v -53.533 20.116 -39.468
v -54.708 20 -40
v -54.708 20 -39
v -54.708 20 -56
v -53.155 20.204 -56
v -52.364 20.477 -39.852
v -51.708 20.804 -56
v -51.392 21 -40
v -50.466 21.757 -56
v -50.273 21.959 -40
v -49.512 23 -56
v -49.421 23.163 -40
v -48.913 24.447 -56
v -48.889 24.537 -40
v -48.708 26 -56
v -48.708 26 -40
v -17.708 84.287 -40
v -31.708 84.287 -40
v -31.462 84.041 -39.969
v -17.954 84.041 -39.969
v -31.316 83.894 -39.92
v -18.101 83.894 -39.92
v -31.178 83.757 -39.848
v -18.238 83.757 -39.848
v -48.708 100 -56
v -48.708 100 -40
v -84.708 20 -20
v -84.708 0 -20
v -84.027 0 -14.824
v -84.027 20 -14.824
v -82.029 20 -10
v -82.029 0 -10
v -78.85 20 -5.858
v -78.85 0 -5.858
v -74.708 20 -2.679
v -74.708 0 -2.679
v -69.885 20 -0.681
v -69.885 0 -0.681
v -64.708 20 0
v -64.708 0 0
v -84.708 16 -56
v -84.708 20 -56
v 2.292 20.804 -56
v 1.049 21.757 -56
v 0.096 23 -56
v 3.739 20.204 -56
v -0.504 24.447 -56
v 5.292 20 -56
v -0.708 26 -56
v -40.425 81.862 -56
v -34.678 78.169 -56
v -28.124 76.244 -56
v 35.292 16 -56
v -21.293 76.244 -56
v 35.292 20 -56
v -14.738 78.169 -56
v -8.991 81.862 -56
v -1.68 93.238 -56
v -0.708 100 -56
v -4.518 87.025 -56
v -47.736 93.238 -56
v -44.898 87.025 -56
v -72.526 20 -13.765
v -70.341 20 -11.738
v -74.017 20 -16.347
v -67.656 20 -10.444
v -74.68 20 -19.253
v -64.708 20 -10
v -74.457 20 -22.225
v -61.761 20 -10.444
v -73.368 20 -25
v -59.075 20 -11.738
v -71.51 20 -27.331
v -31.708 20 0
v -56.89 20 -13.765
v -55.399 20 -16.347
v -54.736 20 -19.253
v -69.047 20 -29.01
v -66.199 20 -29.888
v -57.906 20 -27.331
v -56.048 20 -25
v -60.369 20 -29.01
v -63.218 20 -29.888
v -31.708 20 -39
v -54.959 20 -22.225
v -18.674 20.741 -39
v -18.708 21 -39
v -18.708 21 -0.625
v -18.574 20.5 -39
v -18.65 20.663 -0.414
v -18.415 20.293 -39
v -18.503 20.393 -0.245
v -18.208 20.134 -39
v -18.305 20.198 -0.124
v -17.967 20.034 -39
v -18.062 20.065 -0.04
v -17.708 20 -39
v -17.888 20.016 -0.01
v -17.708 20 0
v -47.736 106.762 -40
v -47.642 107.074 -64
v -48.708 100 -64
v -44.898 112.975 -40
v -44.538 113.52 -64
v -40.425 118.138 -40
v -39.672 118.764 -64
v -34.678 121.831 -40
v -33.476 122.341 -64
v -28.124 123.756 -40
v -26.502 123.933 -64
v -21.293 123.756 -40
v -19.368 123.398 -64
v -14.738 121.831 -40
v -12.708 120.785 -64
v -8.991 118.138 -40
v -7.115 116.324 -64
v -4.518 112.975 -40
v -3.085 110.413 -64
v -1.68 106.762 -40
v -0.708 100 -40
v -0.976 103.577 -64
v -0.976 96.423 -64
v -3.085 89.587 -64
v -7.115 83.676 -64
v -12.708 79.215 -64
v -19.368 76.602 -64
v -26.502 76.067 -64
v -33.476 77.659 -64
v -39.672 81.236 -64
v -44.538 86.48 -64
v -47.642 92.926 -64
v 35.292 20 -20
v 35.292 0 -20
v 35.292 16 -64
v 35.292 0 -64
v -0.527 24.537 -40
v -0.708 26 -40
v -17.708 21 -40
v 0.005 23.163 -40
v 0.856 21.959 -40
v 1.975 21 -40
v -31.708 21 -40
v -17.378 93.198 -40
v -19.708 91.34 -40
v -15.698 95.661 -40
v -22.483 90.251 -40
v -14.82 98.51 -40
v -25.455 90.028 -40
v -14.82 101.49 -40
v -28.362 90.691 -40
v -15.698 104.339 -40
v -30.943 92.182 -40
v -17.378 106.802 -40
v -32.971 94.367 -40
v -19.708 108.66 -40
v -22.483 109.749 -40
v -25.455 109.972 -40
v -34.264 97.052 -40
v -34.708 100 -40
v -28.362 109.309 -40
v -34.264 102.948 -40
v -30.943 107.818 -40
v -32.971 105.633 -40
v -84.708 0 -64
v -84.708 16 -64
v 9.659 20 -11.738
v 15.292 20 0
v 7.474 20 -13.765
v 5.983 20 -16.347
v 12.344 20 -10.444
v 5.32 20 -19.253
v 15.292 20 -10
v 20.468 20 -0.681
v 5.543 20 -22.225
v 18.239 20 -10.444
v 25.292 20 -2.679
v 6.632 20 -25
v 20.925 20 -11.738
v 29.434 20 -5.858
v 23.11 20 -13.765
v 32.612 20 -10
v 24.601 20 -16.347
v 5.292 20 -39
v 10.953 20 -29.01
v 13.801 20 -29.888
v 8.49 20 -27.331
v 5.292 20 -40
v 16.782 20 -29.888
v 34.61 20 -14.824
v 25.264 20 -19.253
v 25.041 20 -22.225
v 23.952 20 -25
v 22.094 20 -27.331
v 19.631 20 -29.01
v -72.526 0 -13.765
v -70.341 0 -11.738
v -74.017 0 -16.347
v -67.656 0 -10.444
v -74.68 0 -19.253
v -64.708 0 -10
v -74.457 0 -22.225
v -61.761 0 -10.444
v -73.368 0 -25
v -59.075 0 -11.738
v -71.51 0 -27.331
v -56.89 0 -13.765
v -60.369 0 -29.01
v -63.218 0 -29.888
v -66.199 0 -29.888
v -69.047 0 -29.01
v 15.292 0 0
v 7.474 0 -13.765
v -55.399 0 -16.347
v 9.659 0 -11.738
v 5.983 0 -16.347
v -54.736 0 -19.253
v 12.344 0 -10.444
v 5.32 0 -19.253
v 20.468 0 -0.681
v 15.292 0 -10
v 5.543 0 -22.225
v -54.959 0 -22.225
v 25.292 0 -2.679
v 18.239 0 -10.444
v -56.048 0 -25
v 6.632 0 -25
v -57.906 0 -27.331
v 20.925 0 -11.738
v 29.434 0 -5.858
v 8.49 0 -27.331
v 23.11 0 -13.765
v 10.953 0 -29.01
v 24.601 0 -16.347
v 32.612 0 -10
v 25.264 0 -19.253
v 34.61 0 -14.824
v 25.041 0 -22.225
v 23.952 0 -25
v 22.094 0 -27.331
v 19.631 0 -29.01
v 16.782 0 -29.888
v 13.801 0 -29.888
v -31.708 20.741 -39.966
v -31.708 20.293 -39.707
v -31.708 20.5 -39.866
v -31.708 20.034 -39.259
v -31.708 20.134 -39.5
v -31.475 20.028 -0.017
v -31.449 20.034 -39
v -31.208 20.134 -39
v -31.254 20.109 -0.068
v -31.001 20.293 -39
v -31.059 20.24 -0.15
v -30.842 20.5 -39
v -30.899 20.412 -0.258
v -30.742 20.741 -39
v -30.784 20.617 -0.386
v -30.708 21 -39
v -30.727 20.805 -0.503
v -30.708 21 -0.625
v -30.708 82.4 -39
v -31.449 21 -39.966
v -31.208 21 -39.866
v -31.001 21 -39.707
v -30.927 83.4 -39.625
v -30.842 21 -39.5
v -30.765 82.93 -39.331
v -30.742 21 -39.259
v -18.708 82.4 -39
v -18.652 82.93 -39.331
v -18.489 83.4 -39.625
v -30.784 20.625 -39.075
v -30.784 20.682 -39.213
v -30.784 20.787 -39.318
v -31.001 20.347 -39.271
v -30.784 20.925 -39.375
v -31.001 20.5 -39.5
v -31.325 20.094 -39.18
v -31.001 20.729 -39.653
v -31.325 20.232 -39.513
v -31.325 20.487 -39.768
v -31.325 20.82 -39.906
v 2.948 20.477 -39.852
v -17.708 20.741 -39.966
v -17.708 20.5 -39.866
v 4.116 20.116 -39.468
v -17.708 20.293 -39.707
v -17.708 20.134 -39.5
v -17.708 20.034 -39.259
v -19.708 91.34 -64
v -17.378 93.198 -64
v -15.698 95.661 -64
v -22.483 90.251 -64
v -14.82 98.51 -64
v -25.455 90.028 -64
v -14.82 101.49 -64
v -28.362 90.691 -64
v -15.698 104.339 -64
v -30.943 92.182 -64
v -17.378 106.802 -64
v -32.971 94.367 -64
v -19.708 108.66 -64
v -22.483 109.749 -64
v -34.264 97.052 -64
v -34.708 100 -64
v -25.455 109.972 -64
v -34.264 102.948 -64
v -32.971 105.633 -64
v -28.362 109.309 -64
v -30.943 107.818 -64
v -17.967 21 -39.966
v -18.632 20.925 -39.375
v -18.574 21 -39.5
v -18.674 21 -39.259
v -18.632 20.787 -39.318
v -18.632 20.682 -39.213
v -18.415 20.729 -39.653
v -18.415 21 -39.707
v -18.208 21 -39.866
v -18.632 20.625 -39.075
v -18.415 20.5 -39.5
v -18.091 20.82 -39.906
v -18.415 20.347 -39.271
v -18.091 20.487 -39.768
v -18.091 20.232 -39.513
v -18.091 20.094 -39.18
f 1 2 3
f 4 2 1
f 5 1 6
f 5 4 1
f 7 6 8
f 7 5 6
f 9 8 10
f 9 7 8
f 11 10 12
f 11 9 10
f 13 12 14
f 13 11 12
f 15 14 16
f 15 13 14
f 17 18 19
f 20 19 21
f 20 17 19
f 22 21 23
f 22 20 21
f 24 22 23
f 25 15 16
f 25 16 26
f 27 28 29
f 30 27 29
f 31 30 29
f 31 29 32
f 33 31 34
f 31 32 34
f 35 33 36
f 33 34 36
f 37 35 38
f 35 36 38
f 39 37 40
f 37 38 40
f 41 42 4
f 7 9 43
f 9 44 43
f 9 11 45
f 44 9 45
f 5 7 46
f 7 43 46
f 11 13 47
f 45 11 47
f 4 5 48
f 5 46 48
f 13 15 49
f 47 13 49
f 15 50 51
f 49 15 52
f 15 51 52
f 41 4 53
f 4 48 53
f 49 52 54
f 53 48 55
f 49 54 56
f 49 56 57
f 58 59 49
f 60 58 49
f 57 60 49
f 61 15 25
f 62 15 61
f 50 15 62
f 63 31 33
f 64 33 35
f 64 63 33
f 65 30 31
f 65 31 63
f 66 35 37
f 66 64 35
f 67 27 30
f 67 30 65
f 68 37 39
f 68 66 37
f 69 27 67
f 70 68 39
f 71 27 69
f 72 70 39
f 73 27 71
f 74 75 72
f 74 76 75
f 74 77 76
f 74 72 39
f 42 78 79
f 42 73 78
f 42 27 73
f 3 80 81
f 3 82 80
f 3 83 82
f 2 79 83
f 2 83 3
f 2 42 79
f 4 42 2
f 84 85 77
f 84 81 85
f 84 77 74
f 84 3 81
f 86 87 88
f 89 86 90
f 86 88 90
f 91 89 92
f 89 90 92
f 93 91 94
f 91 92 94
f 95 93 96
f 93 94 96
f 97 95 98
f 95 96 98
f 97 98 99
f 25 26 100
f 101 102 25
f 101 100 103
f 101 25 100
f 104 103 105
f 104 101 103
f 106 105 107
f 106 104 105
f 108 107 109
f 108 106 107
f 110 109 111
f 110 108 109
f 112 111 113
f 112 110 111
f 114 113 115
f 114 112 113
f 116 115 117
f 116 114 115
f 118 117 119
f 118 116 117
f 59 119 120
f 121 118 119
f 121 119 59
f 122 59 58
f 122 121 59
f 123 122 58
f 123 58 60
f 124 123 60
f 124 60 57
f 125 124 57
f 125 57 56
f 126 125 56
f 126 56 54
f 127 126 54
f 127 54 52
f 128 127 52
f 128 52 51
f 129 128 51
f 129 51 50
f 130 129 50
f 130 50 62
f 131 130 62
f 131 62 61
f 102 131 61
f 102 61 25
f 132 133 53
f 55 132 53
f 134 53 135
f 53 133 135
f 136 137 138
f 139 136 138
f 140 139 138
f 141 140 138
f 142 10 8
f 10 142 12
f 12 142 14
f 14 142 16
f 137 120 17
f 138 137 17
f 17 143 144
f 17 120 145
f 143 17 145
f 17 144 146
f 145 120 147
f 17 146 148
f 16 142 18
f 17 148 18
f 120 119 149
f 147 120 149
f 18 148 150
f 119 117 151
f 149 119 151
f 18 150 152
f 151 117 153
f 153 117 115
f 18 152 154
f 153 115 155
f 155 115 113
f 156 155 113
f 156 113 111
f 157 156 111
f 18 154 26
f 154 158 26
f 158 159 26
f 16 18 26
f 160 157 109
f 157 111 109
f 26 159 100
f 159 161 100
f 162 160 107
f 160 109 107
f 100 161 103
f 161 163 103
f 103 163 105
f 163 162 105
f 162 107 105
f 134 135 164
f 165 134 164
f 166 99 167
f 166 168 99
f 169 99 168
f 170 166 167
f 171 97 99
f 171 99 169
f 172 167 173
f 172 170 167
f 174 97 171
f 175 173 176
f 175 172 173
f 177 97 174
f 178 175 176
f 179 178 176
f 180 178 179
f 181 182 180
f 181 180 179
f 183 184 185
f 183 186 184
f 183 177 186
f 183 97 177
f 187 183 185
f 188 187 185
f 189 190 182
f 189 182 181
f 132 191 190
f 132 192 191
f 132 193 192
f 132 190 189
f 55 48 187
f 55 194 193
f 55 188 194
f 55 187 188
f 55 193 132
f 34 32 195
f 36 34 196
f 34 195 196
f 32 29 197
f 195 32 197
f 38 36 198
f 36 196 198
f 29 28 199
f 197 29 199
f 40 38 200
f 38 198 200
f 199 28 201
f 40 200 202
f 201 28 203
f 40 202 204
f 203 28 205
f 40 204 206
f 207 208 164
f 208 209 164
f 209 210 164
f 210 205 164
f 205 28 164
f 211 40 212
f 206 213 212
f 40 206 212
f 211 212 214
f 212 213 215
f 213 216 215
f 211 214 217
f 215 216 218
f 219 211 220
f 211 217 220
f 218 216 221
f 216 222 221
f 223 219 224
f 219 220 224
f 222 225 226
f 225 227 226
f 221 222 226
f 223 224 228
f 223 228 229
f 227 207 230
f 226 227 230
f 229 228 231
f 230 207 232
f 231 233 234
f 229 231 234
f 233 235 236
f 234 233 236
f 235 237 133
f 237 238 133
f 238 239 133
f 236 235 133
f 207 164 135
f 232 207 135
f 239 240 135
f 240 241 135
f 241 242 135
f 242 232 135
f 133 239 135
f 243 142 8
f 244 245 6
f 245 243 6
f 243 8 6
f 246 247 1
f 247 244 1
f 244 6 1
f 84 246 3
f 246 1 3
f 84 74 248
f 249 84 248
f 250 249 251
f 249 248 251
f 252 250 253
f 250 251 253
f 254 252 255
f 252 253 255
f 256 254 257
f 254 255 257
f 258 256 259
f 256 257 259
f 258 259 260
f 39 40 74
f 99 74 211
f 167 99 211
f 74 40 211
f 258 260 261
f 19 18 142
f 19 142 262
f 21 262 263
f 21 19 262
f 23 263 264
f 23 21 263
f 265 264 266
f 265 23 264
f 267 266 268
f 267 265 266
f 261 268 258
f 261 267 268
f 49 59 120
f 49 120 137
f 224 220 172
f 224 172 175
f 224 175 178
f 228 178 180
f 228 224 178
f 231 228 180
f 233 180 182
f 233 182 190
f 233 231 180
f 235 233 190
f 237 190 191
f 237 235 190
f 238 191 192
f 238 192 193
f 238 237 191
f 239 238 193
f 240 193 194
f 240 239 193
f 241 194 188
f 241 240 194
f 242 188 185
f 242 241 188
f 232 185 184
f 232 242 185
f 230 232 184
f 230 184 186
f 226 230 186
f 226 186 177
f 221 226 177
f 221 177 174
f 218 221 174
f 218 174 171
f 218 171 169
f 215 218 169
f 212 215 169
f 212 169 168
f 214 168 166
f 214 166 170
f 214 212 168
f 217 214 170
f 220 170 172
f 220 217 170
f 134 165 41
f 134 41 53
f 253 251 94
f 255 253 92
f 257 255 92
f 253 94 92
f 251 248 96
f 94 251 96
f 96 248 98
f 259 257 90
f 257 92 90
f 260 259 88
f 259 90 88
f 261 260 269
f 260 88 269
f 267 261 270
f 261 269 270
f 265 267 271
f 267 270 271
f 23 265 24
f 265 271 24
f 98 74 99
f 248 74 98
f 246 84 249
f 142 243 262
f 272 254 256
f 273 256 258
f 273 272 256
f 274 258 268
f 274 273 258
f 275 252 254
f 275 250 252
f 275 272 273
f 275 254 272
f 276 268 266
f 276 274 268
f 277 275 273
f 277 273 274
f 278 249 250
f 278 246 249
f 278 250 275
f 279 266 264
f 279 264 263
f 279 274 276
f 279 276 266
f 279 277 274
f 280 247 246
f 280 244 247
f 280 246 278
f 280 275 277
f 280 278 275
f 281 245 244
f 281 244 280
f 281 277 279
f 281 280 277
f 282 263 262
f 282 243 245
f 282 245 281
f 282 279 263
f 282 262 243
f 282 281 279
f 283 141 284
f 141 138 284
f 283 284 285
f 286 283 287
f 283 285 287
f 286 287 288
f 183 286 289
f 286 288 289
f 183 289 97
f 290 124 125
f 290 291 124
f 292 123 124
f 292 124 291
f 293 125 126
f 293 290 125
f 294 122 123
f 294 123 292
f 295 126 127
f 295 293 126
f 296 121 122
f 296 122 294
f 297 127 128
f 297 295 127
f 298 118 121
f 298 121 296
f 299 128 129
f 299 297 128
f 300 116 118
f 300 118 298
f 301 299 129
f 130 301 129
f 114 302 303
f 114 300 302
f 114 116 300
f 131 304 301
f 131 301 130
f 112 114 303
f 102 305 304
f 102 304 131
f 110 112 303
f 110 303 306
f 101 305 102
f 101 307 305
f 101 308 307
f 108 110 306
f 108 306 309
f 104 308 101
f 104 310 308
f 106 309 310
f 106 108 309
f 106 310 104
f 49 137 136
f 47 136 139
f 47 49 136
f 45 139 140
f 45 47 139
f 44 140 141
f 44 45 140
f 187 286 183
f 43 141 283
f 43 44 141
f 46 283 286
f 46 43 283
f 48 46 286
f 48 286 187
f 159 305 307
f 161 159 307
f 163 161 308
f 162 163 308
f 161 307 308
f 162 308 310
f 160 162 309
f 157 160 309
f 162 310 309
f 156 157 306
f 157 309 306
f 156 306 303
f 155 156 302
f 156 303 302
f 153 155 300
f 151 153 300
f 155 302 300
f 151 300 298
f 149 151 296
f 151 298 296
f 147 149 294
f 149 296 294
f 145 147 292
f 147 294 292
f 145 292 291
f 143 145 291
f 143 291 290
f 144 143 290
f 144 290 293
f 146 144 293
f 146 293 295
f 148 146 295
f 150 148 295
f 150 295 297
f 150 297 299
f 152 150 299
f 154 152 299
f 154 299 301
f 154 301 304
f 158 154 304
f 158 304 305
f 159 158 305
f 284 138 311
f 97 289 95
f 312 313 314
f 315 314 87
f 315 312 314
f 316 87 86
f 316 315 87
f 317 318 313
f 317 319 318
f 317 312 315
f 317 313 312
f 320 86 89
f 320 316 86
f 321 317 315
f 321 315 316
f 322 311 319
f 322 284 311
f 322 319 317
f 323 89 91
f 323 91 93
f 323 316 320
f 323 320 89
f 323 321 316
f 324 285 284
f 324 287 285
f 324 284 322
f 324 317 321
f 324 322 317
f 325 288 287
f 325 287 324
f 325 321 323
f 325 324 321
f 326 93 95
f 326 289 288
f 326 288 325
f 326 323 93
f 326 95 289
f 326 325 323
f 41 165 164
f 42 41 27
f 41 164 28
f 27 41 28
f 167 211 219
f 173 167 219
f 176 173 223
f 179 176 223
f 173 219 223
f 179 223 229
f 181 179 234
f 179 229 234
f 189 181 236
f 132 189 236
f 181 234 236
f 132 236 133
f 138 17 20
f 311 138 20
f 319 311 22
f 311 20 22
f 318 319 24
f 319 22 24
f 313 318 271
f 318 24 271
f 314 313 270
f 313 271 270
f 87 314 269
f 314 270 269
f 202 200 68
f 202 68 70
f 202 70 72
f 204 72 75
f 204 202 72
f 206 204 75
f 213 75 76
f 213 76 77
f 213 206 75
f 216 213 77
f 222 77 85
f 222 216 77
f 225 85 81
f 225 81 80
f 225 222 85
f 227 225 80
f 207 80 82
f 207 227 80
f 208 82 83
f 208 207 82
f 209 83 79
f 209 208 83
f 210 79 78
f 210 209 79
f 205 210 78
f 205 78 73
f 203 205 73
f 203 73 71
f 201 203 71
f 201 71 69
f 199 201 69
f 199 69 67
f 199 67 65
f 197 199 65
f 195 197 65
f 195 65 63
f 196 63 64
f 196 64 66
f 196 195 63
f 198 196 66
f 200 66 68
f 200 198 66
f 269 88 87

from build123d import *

# Parameters (mm, degrees)
SKETCH2_R           = 10
BOSS_EXTRUDE1_DEPTH = 20
SKETCH3_W           = 120
SKETCH3_H           = 8
CUT_EXTRUDE1_DEPTH  = 4
SKETCH7_R           = 10
BOSS_EXTRUDE2_DEPTH = 16
BOSS_EXTRUDE3_START = 8
SKETCH8_R           = 24
SKETCH8_R_2         = 10
BOSS_EXTRUDE3_DEPTH = 8
RIB4_REACH          = 153.895
SKETCH9_WALL_W      = 381.261249794
SKETCH9_WALL_H      = 12
FILLET2_R           = 1


with BuildPart() as part:
    # Sketch2 → Boss-Extrude1 (new body)
    with BuildSketch(Plane(origin=(0, 0, 0), x_dir=(1, 0, 0), z_dir=(0, 1, 0))):
        with BuildLine():
            Line((-64.708154955, 0), (15.291845045, 0))
            ThreePointArc((15.291845045, 0), (29.433980669, 5.857864376), (35.291845045, 20))
            Line((35.291845045, 20), (35.291845045, 64))
            Line((35.291845045, 64), (-84.708154955, 64))
            Line((-84.708154955, 64), (-84.708154955, 20))
            ThreePointArc((-84.708154955, 20), (-78.850290578, 5.857864376), (-64.708154955, 0))
        make_face()
        with Locations(Location((-64.708154955, 20, 0), (0, 0, 270))):
            Circle(SKETCH2_R, mode=Mode.SUBTRACT)
        with Locations(Location((15.291845045, 20, 0), (0, 0, 270))):
            Circle(SKETCH2_R, mode=Mode.SUBTRACT)
    extrude(amount=BOSS_EXTRUDE1_DEPTH)

    # Sketch3 → Cut-Extrude1 (cut)
    with BuildSketch(Plane(origin=(0, 20, 0), x_dir=(1, 0, 0), z_dir=(0, 1, 0))):
        with Locations((-24.708154955, 60)):
            Rectangle(SKETCH3_W, SKETCH3_H)
    extrude(amount=-CUT_EXTRUDE1_DEPTH, mode=Mode.SUBTRACT)

    # Sketch7 → Boss-Extrude2 (add)
    with BuildSketch(Plane(origin=(0, 0, -56), x_dir=(-1, 0, 0), z_dir=(0, 0, -1))):
        with BuildLine():
            Line((24.708154955, 20), (54.708154955, 20))
            ThreePointArc((54.708154955, 20), (50.465514267, 21.757359313), (48.708154955, 26))
            Line((48.708154955, 26), (48.708154955, 100))
            ThreePointArc((48.708154955, 100), (24.708154955, 124), (0.708154955, 100))
            Line((0.708154955, 100), (0.708154955, 26))
            ThreePointArc((0.708154955, 26), (-1.049204358, 21.757359313), (-5.291845045, 20))
            Line((-5.291845045, 20), (24.708154955, 20))
        make_face()
        with Locations((24.708154955, 100)):
            Circle(SKETCH7_R, mode=Mode.SUBTRACT)
    extrude(amount=-BOSS_EXTRUDE2_DEPTH)

    # Sketch8 → Boss-Extrude3 (add)
    with BuildSketch(Plane(origin=(0, 0, -56), x_dir=(-1, 0, 0), z_dir=(0, 0, -1)).offset(BOSS_EXTRUDE3_START)):
        with Locations((24.708154955, 100)):
            Circle(SKETCH8_R)
        with Locations((24.708154955, 100)):
            Circle(SKETCH8_R_2, mode=Mode.SUBTRACT)
    extrude(amount=-BOSS_EXTRUDE3_DEPTH)

    # Sketch9 wall → Rib4 (add, up to next)
    with BuildSketch(Plane(origin=(-24.708154955, 52, -20), x_dir=(0, 0.847998304005, -0.529998940003), z_dir=(0, -0.529998940003, -0.847998304005)), mode=Mode.PRIVATE) as rib4_sk1:
        Rectangle(SKETCH9_WALL_W, SKETCH9_WALL_H)
    rib4_tool1 = extrude(rib4_sk1.sketch, amount=RIB4_REACH, mode=Mode.PRIVATE) - part.part
    add(rib4_tool1.solids().sort_by_distance((-24.708154955, 52, -20))[0])

    # Fillet2
    fillet2_edges = [part.edges().sort_by_distance(p)[0] for p in [
        (-6.708154955, 20, -40),
        (-42.708154955, 20, -40),
        (-24.708154955, 84, -40),
        (-30.708154955, 20, -20),
        (-30.708154955, 52, -40),
        (-18.708154955, 52, -40),
        (-18.708154955, 20, -20),
    ]]
    fillet(fillet2_edges, radius=FILLET2_R)


solid = part.part
